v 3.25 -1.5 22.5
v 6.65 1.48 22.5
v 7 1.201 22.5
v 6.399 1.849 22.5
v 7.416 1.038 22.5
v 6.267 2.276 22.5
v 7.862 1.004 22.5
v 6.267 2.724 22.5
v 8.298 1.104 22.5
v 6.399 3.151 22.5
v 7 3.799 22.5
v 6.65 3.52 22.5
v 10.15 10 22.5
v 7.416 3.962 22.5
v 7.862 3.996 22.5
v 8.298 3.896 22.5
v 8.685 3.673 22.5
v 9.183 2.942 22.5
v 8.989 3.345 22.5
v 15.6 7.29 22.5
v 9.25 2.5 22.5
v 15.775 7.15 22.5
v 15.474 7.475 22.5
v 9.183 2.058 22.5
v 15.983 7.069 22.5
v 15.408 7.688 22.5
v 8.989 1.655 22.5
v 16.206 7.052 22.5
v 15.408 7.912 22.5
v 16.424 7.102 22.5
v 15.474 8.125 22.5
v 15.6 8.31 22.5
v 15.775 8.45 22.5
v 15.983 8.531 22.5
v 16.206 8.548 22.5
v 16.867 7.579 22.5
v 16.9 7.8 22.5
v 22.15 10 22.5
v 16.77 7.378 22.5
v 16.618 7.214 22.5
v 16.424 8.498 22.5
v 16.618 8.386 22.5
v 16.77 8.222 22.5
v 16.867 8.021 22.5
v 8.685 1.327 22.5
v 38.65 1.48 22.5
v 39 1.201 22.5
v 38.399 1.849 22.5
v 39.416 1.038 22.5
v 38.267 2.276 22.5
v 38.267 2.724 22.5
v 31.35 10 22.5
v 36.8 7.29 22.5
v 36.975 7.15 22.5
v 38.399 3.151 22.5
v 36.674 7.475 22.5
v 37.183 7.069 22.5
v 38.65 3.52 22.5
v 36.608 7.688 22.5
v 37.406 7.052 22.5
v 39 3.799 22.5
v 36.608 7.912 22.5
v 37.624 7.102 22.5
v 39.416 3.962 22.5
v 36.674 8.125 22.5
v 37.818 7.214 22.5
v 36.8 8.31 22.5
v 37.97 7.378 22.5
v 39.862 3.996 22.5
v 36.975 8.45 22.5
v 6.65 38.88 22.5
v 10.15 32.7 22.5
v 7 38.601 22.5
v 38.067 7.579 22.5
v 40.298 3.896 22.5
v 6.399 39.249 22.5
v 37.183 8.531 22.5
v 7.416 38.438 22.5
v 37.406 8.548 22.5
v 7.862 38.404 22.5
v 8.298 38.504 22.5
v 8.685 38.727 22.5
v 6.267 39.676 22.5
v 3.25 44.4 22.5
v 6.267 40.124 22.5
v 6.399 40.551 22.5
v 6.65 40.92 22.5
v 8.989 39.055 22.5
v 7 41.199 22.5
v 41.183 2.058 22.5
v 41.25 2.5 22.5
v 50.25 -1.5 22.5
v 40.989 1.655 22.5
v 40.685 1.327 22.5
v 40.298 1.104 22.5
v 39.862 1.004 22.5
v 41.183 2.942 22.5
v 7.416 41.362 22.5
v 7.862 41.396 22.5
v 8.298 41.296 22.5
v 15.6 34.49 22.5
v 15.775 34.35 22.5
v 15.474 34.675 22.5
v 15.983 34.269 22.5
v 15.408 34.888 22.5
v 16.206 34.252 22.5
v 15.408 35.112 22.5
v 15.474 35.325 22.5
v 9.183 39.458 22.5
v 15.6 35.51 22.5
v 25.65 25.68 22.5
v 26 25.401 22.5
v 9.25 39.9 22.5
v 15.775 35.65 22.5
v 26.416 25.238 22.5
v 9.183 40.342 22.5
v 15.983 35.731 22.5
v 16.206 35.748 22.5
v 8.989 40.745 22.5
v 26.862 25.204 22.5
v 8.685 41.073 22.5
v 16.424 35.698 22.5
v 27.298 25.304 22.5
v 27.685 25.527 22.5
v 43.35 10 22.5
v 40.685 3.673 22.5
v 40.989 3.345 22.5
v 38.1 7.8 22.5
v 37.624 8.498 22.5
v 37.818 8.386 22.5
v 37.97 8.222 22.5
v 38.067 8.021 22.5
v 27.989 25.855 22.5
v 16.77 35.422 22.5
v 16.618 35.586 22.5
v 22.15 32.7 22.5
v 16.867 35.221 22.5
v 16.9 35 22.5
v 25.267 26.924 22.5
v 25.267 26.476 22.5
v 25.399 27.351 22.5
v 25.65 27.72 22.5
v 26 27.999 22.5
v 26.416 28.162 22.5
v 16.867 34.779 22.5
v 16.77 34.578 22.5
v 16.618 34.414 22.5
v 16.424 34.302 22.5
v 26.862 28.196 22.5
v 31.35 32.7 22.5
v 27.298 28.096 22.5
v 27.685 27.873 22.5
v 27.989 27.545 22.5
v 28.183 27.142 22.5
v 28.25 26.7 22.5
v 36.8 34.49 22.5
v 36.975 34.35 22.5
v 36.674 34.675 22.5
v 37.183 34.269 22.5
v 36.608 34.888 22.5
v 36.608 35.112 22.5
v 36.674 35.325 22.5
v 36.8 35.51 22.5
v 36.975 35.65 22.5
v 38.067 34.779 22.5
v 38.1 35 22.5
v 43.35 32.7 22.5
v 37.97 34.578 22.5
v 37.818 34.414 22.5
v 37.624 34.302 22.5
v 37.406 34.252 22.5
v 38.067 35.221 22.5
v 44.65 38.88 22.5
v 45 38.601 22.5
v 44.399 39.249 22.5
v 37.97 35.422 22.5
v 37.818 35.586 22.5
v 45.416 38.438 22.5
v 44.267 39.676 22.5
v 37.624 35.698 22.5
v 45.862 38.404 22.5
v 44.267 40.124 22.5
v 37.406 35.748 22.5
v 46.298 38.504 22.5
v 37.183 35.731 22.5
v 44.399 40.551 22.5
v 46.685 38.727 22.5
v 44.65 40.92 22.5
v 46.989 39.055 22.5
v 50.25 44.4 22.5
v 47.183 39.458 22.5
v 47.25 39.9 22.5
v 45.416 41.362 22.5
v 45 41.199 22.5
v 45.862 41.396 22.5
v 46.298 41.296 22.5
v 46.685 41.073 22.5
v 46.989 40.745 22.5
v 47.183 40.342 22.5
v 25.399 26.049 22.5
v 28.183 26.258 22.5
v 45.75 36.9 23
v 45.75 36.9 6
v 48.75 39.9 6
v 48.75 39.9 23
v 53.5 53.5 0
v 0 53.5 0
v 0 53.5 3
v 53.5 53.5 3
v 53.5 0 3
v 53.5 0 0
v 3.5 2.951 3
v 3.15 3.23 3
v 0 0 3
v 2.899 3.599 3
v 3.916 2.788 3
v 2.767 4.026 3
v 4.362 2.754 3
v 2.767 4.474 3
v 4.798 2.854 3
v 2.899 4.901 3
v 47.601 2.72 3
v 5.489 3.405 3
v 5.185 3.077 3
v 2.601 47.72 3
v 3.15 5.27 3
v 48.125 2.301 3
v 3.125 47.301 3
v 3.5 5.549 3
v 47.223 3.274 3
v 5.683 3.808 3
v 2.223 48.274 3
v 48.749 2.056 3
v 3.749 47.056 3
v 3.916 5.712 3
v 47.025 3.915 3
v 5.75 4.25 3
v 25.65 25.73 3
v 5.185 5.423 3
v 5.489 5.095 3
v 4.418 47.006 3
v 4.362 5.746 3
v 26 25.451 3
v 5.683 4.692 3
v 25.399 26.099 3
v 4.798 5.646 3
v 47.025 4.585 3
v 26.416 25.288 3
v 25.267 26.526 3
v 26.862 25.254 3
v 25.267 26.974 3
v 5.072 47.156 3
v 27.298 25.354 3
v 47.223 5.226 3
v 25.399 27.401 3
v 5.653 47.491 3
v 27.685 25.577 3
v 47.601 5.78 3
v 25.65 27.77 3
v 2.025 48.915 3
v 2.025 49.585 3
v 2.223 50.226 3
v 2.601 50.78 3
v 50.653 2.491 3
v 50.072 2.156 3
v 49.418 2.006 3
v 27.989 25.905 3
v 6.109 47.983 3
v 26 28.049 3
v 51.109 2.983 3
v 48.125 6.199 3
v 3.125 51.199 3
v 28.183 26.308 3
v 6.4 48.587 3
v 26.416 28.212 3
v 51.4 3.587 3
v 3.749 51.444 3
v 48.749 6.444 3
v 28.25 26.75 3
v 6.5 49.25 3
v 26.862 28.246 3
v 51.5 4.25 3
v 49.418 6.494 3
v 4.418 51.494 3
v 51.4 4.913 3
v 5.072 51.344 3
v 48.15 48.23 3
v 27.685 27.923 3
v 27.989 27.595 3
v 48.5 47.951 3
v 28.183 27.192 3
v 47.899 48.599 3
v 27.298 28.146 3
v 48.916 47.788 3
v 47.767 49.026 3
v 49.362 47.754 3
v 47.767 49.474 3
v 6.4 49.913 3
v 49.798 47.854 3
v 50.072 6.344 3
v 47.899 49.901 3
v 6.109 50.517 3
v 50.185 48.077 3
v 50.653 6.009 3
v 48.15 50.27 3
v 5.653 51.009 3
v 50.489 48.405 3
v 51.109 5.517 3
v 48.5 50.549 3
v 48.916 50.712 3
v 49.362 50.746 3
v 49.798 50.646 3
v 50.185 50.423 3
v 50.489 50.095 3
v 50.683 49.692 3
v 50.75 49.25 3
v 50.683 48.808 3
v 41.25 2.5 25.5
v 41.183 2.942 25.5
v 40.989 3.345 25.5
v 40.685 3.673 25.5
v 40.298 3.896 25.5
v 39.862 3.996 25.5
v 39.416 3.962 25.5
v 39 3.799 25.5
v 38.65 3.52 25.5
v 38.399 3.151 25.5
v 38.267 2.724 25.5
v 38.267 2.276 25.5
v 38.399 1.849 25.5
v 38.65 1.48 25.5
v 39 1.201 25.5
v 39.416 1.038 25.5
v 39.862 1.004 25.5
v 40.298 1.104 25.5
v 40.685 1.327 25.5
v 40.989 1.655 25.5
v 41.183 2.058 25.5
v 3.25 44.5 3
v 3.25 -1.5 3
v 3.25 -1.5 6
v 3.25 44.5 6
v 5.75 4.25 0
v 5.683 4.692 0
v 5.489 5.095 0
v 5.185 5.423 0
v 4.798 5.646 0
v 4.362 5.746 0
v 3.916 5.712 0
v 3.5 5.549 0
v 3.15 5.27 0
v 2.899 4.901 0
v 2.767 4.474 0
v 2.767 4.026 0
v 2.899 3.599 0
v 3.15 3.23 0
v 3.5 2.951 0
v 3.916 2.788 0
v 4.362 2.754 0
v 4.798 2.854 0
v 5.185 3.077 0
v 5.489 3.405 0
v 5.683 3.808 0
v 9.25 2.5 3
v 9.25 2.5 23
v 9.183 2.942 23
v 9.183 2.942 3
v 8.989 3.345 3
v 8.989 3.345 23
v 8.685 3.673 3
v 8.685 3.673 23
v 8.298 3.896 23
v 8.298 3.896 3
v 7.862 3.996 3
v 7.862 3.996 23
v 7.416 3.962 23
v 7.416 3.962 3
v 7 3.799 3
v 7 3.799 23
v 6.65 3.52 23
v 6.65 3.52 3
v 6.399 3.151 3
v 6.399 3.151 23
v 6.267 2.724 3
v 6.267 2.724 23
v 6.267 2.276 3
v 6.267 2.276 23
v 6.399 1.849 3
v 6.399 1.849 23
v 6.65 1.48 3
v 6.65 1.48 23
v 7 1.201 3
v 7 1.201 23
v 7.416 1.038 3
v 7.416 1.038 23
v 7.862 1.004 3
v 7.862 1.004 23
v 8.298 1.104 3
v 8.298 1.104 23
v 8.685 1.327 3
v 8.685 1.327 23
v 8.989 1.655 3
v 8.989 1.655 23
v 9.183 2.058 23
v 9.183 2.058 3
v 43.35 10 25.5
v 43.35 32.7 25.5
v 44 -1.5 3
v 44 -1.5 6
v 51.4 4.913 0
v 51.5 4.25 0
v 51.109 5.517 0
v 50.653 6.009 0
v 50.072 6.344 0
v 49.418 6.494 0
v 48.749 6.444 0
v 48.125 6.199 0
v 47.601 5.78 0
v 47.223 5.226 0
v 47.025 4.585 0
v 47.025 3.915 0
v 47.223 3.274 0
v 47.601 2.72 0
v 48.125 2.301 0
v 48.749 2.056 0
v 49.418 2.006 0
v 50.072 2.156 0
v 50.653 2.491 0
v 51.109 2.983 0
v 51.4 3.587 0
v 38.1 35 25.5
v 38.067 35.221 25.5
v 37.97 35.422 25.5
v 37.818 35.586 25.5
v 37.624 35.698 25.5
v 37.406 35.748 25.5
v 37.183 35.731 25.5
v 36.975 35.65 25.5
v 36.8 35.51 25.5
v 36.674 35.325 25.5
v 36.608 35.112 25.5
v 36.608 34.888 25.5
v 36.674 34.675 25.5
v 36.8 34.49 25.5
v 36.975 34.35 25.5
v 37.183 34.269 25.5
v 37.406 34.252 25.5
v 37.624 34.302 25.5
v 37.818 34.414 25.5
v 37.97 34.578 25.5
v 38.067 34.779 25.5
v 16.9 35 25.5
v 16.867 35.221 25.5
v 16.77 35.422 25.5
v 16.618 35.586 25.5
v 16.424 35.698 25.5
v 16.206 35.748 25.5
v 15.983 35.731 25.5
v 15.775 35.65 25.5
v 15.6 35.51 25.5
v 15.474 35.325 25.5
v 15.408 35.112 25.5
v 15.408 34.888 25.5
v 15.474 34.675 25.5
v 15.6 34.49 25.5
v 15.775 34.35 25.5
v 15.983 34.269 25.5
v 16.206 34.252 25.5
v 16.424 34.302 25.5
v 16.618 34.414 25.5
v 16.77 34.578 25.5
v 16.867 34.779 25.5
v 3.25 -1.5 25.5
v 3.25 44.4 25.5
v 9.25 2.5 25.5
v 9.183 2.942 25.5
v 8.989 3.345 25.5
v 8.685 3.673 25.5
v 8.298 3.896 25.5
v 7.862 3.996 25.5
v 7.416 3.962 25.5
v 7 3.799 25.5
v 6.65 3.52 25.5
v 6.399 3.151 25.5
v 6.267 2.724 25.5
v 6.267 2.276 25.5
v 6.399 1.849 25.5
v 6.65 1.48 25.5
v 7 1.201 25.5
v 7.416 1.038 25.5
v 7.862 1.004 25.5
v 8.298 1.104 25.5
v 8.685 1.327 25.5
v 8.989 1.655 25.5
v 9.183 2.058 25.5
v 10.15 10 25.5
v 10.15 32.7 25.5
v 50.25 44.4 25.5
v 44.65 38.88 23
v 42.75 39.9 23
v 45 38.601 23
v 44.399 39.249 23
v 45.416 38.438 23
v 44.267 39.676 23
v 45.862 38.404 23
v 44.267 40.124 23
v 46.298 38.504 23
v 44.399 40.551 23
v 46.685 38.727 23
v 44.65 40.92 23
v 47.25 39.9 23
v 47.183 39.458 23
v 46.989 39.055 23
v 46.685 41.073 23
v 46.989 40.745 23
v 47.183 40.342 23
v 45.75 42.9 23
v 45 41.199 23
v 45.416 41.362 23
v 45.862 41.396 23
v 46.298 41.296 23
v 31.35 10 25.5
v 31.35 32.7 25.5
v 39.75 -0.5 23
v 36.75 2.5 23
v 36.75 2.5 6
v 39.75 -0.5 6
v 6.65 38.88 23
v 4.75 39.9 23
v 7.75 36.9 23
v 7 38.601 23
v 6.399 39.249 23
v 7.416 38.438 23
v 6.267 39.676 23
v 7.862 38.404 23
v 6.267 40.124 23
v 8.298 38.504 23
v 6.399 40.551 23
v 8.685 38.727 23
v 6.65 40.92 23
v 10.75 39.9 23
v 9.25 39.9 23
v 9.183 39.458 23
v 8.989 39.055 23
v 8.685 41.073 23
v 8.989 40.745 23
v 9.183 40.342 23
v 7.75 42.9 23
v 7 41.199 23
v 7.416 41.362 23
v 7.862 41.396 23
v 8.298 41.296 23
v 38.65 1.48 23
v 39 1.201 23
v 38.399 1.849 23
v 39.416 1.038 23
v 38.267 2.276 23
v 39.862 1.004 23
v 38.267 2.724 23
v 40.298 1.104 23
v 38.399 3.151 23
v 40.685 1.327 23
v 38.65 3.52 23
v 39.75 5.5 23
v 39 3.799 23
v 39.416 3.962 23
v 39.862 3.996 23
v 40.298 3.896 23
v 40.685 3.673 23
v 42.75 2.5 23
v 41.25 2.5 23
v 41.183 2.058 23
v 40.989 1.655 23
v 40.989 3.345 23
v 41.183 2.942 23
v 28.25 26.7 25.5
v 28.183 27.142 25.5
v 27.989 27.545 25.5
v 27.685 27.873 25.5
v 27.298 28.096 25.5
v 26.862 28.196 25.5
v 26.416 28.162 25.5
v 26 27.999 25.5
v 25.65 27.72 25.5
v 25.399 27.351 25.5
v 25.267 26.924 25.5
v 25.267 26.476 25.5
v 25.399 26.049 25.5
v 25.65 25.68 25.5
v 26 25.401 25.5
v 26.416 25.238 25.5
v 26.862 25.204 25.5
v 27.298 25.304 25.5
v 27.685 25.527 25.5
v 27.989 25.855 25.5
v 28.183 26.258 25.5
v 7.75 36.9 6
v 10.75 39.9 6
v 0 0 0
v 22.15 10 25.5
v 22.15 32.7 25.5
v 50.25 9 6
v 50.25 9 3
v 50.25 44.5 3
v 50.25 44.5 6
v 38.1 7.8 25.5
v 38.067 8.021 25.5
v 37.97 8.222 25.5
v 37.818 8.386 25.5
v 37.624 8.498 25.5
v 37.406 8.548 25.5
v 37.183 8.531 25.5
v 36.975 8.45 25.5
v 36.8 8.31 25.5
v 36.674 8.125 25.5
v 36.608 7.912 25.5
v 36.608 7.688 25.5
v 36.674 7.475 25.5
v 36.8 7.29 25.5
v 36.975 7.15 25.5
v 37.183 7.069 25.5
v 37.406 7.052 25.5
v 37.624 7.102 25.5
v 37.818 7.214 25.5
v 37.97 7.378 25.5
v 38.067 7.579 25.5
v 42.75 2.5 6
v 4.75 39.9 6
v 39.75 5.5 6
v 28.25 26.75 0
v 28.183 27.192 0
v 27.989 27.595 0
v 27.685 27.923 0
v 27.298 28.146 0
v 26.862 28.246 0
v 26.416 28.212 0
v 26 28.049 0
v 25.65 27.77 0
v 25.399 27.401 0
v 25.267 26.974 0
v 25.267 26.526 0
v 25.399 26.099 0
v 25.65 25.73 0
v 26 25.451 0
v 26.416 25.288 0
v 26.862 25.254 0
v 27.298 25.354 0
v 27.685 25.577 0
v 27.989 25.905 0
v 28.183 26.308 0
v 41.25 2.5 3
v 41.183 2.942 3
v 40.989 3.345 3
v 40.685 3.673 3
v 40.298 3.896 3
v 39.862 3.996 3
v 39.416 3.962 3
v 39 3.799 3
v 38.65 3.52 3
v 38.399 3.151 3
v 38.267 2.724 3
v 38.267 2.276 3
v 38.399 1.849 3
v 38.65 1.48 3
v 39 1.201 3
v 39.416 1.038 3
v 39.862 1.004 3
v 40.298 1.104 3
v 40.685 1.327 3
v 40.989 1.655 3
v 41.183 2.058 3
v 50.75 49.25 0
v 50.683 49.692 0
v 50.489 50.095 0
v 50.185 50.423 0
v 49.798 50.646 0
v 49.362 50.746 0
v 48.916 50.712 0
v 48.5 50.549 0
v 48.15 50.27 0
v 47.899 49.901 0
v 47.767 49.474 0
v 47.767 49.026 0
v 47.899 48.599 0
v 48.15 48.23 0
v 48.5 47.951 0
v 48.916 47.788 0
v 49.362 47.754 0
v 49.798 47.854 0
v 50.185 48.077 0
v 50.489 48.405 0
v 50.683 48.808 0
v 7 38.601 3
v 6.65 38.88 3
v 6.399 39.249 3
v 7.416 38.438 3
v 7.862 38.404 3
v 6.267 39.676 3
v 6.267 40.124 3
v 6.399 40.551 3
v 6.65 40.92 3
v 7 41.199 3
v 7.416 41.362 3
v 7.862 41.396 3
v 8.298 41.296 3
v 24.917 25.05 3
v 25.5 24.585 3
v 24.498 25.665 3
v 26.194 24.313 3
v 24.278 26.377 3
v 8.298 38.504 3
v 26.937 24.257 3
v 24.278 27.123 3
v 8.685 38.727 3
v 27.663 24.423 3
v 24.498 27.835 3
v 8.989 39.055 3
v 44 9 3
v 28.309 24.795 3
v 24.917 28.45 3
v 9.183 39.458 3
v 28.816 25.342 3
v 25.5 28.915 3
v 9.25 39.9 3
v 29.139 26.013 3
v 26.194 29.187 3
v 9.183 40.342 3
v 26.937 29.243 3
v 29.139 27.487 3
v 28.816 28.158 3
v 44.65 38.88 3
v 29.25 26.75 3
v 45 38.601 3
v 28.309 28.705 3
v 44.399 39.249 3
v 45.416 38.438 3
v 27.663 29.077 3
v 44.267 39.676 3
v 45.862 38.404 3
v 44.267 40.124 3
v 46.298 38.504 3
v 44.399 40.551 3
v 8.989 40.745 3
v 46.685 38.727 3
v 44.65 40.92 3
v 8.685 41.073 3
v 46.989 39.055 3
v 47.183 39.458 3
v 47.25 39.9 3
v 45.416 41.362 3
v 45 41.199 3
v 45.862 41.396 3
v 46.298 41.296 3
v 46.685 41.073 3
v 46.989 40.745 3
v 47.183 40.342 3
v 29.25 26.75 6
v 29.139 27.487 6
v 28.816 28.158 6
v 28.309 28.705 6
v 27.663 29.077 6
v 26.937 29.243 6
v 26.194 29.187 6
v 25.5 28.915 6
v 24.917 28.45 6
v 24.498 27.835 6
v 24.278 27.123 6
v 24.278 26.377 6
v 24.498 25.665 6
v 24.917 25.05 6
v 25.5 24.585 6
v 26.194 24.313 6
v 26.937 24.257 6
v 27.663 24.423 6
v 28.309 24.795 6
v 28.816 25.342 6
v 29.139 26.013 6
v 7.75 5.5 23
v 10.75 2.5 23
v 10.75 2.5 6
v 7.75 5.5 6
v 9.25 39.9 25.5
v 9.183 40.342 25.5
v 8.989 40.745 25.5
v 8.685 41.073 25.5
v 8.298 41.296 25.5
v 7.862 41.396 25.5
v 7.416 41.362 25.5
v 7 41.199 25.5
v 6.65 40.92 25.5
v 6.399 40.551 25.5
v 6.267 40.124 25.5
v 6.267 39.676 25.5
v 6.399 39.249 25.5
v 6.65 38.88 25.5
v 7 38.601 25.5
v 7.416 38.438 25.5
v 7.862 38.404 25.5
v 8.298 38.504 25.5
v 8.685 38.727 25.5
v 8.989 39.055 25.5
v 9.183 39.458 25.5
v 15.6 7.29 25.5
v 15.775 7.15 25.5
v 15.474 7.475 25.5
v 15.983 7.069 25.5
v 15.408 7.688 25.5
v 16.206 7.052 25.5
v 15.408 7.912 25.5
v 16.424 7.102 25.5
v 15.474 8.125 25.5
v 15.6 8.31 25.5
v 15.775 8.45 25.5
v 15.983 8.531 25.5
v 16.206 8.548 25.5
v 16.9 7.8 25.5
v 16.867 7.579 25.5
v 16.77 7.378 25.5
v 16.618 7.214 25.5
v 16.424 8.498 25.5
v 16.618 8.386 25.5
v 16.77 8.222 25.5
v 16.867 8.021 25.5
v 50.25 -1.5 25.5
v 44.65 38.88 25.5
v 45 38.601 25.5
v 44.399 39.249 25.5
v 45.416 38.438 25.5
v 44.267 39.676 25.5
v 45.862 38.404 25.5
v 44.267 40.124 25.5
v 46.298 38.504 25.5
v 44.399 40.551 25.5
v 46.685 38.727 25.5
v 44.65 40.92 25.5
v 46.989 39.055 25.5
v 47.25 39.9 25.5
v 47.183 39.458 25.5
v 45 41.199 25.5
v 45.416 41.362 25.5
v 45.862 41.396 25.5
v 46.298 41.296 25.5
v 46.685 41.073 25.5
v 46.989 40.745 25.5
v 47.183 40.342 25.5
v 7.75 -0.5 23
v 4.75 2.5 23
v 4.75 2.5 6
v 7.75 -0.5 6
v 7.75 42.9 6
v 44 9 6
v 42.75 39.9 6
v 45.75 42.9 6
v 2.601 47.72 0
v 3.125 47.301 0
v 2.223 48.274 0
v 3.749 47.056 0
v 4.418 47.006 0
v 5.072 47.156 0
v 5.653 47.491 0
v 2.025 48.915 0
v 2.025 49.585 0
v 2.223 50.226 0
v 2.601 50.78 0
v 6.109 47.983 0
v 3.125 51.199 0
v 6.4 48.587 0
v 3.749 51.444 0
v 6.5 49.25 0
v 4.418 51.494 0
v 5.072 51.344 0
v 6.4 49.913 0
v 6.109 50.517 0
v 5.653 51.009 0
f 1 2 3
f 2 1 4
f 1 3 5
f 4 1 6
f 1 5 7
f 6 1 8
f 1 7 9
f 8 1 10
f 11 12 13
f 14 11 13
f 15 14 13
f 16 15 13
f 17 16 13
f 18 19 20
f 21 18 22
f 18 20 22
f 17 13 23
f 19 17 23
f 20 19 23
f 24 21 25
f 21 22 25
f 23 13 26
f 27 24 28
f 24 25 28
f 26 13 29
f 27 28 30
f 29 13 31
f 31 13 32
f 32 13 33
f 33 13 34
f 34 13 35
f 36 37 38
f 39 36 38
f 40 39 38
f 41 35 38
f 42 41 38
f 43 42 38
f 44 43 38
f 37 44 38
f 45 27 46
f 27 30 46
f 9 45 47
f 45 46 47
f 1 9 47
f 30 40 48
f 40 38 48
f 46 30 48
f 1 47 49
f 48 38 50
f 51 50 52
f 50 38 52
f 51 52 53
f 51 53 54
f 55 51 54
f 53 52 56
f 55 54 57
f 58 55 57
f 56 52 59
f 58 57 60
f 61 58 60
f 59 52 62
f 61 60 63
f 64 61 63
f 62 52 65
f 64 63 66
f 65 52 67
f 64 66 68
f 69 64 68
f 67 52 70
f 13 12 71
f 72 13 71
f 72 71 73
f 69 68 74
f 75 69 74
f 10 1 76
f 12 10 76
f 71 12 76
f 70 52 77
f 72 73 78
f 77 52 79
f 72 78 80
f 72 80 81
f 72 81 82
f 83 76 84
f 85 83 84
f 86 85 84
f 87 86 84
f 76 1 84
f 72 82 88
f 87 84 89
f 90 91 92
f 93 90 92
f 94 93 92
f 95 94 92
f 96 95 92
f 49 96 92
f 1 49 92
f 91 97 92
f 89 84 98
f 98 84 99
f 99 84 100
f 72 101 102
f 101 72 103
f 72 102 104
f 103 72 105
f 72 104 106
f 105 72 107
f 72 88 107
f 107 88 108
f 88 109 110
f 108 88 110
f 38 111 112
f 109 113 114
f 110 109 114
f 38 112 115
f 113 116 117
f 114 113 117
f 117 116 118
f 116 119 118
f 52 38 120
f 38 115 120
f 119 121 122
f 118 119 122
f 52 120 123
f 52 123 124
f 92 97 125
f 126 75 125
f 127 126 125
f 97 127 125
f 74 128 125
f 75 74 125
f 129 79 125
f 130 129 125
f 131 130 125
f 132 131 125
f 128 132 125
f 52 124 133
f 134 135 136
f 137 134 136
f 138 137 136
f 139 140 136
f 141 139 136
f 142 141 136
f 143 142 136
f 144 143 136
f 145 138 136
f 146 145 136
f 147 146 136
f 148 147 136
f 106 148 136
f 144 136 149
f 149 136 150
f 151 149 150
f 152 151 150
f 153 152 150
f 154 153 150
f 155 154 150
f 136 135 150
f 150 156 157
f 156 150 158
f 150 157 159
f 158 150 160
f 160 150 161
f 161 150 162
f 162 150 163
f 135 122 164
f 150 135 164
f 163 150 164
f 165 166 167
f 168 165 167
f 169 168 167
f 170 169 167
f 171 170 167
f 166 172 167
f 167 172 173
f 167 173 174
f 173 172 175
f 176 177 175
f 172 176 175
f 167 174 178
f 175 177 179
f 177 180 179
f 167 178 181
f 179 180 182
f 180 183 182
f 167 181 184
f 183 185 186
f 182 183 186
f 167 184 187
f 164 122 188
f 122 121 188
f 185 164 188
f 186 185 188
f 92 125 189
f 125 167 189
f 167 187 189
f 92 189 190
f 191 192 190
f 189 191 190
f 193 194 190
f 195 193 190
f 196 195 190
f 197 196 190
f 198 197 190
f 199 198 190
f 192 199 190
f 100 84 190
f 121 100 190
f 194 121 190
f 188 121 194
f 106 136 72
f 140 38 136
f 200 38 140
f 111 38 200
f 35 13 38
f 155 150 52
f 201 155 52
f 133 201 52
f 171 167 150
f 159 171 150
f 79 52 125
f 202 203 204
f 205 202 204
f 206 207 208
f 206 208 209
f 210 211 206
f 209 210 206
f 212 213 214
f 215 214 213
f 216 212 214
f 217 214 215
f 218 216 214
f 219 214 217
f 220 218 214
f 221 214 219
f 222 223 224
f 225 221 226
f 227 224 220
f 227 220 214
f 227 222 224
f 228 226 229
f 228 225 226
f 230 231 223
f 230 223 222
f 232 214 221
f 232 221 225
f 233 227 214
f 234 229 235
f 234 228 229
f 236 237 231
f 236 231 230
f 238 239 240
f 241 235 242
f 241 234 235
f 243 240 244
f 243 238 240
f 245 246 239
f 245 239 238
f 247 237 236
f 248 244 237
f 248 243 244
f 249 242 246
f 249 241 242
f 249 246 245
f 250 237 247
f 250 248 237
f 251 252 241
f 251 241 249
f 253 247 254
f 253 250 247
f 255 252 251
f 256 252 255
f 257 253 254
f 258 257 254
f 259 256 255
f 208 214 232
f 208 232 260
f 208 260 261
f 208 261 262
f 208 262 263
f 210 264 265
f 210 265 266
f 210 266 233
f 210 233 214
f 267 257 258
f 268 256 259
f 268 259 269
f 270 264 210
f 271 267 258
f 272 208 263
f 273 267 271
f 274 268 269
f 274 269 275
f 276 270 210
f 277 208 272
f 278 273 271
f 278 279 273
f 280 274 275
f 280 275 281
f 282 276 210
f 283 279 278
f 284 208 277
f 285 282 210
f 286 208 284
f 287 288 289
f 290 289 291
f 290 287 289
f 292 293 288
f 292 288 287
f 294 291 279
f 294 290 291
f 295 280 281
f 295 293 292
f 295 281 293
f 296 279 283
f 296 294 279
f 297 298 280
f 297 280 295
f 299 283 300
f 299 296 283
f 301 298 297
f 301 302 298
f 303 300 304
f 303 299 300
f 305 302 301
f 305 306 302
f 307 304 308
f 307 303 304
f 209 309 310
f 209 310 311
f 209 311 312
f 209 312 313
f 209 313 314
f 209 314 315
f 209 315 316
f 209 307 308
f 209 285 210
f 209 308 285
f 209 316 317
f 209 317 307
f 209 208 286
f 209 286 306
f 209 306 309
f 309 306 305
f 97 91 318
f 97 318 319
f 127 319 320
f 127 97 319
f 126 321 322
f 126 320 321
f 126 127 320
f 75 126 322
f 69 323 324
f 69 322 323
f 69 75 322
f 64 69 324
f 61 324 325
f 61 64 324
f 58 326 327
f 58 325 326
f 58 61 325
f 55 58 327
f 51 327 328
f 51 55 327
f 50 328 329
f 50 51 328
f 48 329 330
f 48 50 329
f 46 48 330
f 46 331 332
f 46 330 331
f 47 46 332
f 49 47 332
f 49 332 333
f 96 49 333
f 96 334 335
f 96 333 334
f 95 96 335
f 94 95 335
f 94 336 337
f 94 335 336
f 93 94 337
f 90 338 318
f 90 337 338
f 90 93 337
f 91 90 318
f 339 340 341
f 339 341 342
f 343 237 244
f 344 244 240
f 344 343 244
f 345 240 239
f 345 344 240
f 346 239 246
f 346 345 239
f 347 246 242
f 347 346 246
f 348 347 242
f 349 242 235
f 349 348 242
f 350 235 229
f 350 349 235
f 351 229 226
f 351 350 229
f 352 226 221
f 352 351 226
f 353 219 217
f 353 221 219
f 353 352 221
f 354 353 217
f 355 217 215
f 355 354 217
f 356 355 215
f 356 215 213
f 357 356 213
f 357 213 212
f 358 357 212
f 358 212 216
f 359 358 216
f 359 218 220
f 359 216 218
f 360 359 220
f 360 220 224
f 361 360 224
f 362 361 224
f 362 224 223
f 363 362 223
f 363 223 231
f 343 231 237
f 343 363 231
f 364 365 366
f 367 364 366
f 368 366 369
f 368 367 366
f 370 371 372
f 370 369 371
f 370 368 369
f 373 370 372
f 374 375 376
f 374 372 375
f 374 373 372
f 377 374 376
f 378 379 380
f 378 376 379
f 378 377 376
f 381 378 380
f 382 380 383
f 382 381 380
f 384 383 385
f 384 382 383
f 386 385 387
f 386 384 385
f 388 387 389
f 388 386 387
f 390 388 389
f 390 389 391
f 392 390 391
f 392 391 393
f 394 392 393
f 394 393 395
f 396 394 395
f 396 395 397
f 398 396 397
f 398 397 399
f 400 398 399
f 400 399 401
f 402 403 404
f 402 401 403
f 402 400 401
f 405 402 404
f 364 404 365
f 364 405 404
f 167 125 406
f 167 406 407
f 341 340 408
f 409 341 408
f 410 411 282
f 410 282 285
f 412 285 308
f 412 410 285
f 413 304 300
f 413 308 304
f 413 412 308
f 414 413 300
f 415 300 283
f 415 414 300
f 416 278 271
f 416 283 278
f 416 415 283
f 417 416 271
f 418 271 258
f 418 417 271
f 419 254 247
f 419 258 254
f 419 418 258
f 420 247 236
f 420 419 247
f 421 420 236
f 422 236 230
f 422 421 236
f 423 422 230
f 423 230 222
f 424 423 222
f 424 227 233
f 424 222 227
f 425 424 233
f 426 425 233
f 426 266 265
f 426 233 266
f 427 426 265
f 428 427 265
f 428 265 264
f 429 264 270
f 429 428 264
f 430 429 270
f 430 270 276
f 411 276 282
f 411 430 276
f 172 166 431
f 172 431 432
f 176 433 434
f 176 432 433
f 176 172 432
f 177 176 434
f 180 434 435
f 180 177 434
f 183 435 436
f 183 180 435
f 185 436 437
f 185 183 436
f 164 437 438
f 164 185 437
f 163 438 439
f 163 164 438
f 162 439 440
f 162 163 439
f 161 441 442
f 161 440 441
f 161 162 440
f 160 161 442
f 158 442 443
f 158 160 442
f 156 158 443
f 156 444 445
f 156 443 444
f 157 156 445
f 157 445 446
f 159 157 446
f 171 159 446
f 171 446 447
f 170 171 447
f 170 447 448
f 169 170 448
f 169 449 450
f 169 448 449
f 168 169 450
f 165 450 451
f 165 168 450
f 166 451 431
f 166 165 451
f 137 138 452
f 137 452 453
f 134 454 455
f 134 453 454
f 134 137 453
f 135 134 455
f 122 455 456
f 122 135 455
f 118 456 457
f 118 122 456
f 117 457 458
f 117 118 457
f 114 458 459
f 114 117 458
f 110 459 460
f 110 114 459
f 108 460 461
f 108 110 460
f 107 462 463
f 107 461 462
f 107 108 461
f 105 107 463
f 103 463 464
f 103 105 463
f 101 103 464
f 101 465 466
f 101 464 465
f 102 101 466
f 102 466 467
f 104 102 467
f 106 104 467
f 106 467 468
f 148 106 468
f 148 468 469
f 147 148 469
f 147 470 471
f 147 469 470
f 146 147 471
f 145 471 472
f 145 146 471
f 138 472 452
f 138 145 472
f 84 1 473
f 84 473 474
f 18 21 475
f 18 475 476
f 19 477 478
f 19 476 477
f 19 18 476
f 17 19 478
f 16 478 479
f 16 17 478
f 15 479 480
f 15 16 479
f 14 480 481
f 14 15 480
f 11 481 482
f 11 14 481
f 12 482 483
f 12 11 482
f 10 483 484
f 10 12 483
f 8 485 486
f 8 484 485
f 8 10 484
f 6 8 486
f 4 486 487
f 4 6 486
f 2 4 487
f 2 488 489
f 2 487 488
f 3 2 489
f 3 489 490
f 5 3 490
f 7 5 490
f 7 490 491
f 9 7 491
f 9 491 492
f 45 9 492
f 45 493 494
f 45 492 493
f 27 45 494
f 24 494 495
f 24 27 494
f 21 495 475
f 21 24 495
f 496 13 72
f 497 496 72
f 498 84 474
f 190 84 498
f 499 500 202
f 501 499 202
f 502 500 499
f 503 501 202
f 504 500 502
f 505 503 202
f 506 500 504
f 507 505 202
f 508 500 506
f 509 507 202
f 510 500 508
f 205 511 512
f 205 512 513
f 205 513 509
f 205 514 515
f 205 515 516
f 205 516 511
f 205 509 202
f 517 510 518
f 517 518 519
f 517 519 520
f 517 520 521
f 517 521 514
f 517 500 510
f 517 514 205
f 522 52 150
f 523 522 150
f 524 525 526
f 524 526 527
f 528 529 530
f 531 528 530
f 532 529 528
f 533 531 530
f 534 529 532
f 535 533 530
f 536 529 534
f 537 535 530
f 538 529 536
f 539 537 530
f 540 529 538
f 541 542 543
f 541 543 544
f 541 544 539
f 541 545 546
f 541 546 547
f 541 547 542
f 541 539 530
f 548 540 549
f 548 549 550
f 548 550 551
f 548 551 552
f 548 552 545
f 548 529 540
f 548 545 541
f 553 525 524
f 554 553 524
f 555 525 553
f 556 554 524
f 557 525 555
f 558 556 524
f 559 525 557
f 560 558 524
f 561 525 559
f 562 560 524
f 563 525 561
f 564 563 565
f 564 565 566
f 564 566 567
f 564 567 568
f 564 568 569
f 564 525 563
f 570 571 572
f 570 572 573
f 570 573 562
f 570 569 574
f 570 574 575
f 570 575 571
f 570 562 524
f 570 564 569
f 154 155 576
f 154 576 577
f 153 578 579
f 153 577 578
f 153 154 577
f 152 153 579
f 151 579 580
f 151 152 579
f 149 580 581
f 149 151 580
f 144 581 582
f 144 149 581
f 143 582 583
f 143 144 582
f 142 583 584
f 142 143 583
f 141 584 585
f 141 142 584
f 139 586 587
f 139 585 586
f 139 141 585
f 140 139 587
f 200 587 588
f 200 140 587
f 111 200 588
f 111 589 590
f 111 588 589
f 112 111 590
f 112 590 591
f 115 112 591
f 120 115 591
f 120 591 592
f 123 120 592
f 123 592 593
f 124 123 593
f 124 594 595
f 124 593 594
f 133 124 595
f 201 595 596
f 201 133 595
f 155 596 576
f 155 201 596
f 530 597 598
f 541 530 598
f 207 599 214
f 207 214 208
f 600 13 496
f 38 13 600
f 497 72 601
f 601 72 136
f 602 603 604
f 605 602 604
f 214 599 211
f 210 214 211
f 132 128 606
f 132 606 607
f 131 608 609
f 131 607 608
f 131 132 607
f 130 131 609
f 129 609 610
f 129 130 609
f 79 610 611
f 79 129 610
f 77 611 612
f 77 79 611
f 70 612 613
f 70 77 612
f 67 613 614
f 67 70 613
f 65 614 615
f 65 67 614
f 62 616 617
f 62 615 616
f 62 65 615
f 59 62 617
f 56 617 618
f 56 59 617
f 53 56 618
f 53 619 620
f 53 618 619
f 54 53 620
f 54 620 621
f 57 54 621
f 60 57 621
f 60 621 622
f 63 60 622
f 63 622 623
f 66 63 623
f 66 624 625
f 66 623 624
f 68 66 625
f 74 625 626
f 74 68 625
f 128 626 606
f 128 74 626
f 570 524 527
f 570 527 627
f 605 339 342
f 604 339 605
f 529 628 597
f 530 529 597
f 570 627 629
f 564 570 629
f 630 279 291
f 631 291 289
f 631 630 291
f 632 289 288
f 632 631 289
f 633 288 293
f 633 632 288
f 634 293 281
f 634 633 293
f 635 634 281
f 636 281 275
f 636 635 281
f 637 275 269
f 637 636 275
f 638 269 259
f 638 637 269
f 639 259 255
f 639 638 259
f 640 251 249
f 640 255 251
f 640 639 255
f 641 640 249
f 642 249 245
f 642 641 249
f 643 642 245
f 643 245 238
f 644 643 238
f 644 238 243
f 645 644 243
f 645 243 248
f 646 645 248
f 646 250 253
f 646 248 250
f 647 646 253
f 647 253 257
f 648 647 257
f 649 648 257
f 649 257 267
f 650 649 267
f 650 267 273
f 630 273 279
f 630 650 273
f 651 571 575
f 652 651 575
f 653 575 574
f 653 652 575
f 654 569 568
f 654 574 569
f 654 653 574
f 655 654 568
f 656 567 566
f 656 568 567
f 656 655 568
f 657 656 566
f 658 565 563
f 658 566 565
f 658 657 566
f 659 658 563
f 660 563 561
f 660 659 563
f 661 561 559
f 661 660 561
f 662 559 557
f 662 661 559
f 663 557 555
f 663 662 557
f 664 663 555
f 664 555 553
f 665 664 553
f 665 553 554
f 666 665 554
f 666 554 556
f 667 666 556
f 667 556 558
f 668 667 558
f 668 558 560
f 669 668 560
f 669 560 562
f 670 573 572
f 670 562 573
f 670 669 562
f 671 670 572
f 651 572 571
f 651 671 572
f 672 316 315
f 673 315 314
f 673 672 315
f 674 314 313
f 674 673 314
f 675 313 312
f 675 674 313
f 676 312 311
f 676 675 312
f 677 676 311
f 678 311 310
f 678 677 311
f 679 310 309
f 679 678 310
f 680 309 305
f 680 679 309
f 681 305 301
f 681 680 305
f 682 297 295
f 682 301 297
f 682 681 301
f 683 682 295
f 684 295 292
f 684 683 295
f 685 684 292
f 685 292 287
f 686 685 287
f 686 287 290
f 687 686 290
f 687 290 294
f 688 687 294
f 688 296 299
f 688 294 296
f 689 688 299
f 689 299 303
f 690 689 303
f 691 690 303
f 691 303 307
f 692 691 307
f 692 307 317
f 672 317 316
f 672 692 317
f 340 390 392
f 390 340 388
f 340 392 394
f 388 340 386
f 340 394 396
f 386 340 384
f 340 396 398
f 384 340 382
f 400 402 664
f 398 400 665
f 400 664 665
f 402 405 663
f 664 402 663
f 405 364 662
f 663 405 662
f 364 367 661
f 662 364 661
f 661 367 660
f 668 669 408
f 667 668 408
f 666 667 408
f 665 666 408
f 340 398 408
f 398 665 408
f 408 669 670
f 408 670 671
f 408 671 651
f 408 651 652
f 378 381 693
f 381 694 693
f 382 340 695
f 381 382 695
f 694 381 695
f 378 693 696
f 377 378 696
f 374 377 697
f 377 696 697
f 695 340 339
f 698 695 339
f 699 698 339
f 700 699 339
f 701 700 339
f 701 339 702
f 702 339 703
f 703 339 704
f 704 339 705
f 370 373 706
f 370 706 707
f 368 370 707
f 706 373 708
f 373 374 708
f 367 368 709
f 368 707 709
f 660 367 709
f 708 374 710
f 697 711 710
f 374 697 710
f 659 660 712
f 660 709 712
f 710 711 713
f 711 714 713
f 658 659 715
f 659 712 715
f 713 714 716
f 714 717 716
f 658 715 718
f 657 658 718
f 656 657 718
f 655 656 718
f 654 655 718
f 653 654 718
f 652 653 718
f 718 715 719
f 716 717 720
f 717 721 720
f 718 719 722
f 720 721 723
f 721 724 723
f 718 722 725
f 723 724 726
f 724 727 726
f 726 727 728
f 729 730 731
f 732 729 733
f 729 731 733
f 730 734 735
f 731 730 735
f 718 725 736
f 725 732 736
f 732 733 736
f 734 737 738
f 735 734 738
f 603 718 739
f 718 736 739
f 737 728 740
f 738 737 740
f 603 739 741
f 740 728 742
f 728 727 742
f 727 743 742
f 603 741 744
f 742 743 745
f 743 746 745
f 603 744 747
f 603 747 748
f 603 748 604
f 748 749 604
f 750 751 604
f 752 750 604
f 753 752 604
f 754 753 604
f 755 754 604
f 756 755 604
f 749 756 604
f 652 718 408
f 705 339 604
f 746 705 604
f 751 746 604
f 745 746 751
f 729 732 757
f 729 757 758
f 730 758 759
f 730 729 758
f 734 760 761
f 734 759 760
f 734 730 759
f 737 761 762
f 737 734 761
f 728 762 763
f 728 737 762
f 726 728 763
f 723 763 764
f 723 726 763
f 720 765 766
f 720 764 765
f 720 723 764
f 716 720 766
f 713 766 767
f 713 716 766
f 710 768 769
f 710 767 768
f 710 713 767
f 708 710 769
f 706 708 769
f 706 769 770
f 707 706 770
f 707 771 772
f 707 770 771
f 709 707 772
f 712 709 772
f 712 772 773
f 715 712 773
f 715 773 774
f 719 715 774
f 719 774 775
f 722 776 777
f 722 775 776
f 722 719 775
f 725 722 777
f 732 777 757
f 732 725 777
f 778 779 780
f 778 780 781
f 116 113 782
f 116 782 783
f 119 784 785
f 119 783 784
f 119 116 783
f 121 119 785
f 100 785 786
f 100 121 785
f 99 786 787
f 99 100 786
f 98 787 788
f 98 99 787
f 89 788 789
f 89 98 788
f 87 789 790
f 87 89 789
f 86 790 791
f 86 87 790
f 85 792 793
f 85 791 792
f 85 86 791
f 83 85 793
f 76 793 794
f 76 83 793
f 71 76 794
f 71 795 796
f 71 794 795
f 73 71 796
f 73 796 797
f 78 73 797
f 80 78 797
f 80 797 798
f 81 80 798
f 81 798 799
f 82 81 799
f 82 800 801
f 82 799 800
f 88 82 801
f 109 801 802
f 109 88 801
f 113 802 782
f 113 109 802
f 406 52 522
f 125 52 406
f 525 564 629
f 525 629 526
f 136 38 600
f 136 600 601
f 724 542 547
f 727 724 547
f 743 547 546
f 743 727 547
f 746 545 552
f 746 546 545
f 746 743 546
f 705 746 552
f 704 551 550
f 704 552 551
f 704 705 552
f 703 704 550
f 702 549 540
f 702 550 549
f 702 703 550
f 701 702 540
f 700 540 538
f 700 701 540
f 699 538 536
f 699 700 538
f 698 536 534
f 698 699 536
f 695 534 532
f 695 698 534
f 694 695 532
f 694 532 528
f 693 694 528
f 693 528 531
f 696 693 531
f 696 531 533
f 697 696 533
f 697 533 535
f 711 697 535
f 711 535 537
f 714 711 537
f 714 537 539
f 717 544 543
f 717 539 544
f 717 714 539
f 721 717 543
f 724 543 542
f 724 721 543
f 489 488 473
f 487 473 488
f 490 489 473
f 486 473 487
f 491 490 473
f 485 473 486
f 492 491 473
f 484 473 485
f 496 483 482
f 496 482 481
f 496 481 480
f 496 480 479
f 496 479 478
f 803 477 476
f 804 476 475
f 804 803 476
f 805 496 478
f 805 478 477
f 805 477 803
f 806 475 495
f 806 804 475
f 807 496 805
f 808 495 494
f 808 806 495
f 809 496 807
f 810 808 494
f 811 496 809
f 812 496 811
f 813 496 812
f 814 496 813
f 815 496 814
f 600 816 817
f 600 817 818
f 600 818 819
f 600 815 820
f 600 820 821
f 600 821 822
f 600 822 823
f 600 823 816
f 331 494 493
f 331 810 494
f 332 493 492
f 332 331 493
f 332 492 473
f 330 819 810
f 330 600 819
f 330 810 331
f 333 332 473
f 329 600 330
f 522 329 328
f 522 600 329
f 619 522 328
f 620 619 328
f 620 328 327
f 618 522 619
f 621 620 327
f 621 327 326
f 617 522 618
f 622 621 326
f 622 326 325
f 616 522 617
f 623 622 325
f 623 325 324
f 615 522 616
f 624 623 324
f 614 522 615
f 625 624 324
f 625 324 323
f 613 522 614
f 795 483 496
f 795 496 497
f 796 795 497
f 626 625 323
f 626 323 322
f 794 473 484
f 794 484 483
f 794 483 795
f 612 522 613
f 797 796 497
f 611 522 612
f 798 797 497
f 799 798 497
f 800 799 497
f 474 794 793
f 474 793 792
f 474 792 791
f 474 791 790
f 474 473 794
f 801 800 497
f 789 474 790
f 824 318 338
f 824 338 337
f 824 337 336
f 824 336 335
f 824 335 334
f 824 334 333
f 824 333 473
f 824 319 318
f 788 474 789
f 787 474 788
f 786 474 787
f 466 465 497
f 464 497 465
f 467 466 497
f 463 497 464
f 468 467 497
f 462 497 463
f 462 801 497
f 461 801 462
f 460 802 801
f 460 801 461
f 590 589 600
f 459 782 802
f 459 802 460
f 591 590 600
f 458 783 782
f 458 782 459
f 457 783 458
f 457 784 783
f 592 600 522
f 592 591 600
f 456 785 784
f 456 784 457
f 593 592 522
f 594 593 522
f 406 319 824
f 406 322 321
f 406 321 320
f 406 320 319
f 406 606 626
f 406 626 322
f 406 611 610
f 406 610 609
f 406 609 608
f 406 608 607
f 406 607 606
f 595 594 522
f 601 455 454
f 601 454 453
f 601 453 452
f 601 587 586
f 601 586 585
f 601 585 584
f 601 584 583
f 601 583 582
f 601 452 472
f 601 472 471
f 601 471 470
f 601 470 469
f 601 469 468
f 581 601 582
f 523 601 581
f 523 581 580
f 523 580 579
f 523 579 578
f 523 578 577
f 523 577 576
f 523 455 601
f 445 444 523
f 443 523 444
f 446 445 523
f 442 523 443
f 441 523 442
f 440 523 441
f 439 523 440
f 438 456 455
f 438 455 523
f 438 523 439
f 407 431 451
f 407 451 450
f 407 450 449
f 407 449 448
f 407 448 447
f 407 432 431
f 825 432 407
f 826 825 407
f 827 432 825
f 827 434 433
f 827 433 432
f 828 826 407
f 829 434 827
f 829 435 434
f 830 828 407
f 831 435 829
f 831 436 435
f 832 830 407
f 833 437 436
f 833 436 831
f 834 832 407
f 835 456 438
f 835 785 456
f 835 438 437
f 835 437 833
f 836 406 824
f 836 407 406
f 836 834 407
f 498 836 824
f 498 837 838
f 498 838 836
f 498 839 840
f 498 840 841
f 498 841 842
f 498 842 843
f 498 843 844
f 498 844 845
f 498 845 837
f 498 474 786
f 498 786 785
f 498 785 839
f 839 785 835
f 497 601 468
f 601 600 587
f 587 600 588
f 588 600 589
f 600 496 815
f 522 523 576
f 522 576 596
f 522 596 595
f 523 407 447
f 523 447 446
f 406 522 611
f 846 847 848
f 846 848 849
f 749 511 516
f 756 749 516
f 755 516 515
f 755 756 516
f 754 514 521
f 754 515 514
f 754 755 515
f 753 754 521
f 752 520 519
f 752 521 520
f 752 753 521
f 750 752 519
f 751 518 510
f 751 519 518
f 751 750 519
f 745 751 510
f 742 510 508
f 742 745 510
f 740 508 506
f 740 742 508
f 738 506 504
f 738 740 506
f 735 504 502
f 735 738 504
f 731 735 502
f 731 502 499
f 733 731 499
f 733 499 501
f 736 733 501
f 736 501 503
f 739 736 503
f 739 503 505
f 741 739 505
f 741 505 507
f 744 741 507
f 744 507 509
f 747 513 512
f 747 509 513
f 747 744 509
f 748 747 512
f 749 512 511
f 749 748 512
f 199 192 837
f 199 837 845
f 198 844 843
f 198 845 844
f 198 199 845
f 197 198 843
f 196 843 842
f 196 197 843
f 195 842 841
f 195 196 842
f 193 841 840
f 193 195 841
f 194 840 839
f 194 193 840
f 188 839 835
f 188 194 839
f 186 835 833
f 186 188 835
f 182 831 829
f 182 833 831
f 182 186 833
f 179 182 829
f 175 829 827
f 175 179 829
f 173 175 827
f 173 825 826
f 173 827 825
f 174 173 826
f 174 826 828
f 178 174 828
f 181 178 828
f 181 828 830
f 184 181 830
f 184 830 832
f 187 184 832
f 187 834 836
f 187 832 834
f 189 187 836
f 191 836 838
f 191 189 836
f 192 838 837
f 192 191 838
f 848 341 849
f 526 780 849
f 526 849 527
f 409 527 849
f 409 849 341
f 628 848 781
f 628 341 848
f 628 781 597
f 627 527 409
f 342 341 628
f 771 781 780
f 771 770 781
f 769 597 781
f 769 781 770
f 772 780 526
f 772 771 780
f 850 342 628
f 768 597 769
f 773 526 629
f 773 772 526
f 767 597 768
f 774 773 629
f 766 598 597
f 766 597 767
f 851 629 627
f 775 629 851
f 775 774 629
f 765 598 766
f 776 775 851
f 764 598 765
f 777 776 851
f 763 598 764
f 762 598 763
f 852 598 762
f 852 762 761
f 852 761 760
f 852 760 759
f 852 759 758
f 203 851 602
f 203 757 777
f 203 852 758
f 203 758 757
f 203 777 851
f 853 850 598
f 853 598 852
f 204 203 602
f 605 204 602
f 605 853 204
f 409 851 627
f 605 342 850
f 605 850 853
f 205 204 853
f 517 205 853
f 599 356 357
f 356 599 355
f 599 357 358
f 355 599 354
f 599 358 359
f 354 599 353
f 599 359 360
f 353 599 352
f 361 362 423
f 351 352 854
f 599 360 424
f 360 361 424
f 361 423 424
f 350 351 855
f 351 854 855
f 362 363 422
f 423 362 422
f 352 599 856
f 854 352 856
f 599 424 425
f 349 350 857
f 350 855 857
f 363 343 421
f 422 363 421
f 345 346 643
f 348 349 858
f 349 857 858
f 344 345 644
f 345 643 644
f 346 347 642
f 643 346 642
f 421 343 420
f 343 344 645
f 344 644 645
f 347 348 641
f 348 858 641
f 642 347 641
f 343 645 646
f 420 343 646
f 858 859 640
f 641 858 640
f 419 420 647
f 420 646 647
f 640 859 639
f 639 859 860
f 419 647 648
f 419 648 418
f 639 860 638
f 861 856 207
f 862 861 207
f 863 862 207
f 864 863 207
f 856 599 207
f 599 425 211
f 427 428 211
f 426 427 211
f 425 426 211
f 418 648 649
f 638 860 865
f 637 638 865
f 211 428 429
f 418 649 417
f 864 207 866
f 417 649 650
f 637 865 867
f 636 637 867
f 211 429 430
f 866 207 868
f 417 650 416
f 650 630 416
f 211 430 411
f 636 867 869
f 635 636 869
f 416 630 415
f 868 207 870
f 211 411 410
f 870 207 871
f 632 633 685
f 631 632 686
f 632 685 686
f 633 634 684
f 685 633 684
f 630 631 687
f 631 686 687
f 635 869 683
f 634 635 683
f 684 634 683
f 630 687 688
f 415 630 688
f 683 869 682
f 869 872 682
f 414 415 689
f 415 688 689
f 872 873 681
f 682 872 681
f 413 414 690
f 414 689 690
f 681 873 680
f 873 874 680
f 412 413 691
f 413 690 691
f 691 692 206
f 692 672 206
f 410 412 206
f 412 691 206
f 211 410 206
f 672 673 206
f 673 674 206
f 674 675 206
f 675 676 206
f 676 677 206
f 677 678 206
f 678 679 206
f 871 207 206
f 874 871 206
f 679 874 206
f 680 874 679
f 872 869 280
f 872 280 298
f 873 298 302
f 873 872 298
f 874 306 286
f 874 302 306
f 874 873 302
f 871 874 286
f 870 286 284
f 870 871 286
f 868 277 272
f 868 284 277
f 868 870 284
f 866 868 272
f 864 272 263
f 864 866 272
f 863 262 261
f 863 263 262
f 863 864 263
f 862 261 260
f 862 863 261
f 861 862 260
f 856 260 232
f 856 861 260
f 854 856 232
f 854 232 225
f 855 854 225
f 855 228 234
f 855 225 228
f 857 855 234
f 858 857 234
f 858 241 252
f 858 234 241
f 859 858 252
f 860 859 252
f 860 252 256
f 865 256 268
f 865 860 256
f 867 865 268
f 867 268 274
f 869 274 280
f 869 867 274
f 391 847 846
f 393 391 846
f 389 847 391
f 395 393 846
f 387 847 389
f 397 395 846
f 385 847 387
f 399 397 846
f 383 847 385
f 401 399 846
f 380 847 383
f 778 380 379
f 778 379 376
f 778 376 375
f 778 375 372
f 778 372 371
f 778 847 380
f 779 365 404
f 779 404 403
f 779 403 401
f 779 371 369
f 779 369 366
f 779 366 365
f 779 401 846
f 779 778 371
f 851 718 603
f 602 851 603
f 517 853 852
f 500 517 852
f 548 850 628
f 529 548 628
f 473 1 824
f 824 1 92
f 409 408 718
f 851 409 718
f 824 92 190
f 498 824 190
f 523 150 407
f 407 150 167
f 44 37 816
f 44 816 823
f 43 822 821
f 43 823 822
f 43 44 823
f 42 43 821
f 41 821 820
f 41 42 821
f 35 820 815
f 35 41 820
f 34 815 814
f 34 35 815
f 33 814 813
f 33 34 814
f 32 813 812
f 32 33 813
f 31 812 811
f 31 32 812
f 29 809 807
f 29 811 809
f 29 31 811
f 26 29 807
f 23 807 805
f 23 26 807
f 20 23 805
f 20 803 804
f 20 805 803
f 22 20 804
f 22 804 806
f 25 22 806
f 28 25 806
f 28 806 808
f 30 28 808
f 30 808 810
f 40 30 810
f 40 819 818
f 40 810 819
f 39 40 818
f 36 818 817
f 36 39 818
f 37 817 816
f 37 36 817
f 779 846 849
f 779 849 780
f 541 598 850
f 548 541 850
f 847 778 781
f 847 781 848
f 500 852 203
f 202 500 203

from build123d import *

# Parameters (mm, degrees)
CYLINDER001_R     = 1.5
CYLINDER001_DEPTH = 10
ARRAY001_X_COUNT  = 3
ARRAY001_X_PITCH  = 31.819805
CYLINDER_R        = 2.25
CYLINDER_DEPTH    = 10
ARRAY_X_COUNT     = 2
ARRAY_X_PITCH     = 63.63961
BOX_W             = 53.5
BOX_H             = 53.5
BOX_DEPTH         = 3
CYLINDER009_R     = 1.5
CYLINDER009_DEPTH = 27
PRISM002_DEPTH    = 20
CYLINDER008_R     = 1.5
CYLINDER008_DEPTH = 27
BOX004_W          = 10
BOX004_H          = 11
BOX004_DEPTH      = 3
CYLINDER007_R     = 1.5
CYLINDER007_DEPTH = 27
PRISM001_DEPTH    = 20
CYLINDER003_R     = 1.5
CYLINDER003_DEPTH = 27
ARRAY002_Y_COUNT  = 2
ARRAY002_Y_PITCH  = 37.4
CYLINDER002_R     = 2.5
CYLINDER002_DEPTH = 10
PRISM_DEPTH       = 20
ARRAY003_Y_COUNT  = 2
ARRAY003_Y_PITCH  = 37.4
BOX001_W          = 47
BOX001_H          = 46
BOX001_DEPTH      = 3
CYLINDER011_R     = 1.5
CYLINDER011_DEPTH = 10
CYLINDER010_R     = 1.5
CYLINDER010_DEPTH = 10
CYLINDER006_R     = 0.75
CYLINDER006_DEPTH = 10
ARRAY006_X_COUNT  = 2
ARRAY006_X_PITCH  = 21.2
ARRAY006_Y_COUNT  = 2
ARRAY006_Y_PITCH  = 27.2
BOX003_W          = 12
BOX003_H          = 22.7
BOX003_DEPTH      = 10
ARRAY004_X_COUNT  = 2
ARRAY004_X_PITCH  = 21.2
CYLINDER004_R     = 1.5
CYLINDER004_DEPTH = 10
ARRAY005_Y_COUNT  = 2
ARRAY005_Y_PITCH  = 37.4
CYLINDER005_R     = 1.5
CYLINDER005_DEPTH = 10
BOX002_W          = 47
BOX002_H          = 45.9
BOX002_DEPTH      = 3


with BuildPart() as array001:
    # Cylinder001 → Cylinder001 (new body)
    with BuildSketch(Plane(origin=(4.25, 4.25, 0), x_dir=(1, 0, 0), z_dir=(0, 0, 1))):
        Circle(CYLINDER001_R)
    extrude(amount=CYLINDER001_DEPTH)

    # Array001 X: Array001 ×3


with BuildPart() as array001_1:
    add(array001.part)
    with Locations(*[Vector(0.707107, 0.707107, 0) * (i * ARRAY001_X_PITCH) for i in range(1, ARRAY001_X_COUNT)]):
        add(array001.part)


with BuildPart() as taladros:
    # Cylinder → Cylinder (new body)
    with BuildSketch(Plane(origin=(4.25, 49.25, -4), x_dir=(1, 0, 0), z_dir=(0, 0, 1))):
        Circle(CYLINDER_R)
    extrude(amount=CYLINDER_DEPTH)

    # Array X: Taladros ×2


with BuildPart() as taladros_1:
    add(taladros.part)
    with Locations(*[Vector(0.707107, -0.707107, 0) * (i * ARRAY_X_PITCH) for i in range(1, ARRAY_X_COUNT)]):
        add(taladros.part)

    # Fusion: union Array001
    add(array001_1.part)


with BuildPart() as fuel_temp_plate:
    # Box → Box (new body)
    with BuildSketch(Plane.XY):
        with Locations((26.75, 26.75)):
            Rectangle(BOX_W, BOX_H)
    extrude(amount=BOX_DEPTH)

    # Cut: cut Taladros
    add(taladros_1.part, mode=Mode.SUBTRACT)


with BuildPart() as cylinder009:
    # Cylinder009 → Cylinder009 (new body)
    with BuildSketch(Plane(origin=(39.75, 2.5, 0), x_dir=(1, 0, 0), z_dir=(0, 0, 1))):
        Circle(CYLINDER009_R)
    extrude(amount=CYLINDER009_DEPTH)


with BuildPart() as cut006:
    # Prism002 → Prism002 (new body)
    with BuildSketch(Plane(origin=(39.75, 2.5, 3), x_dir=(1, 0, 0), z_dir=(0, 0, 1))):
        Polygon((3, 0), (0, 3), (-3, 0), (0, -3), align=None)
    extrude(amount=PRISM002_DEPTH)

    # Cut006: cut Cylinder009
    add(cylinder009.part, mode=Mode.SUBTRACT)


with BuildPart() as cylinder008:
    # Cylinder008 → Cylinder008 (new body)
    with BuildSketch(Plane(origin=(39.75, 2.5, 0), x_dir=(1, 0, 0), z_dir=(0, 0, 1))):
        Circle(CYLINDER008_R)
    extrude(amount=CYLINDER008_DEPTH)


with BuildPart() as recorte_placa:
    # Box004 → Box004 (new body)
    with BuildSketch(Plane(origin=(44, -2, 3), x_dir=(1, 0, 0), z_dir=(0, 0, 1))):
        with Locations((5, 5.5)):
            Rectangle(BOX004_W, BOX004_H)
    extrude(amount=BOX004_DEPTH)


with BuildPart() as cylinder007:
    # Cylinder007 → Cylinder007 (new body)
    with BuildSketch(Plane(origin=(45.75, 39.9, 0), x_dir=(1, 0, 0), z_dir=(0, 0, 1))):
        Circle(CYLINDER007_R)
    extrude(amount=CYLINDER007_DEPTH)


with BuildPart() as prism001:
    # Prism001 → Prism001 (new body)
    with BuildSketch(Plane(origin=(45.75, 39.9, 3), x_dir=(1, 0, 0), z_dir=(0, 0, 1))):
        Polygon((3, 0), (0, 3), (-3, 0), (0, -3), align=None)
    extrude(amount=PRISM001_DEPTH)


with BuildPart() as array002:
    # Cylinder003 → Cylinder003 (new body)
    with BuildSketch(Plane(origin=(7.75, 2.5, 0), x_dir=(1, 0, 0), z_dir=(0, 0, 1))):
        Circle(CYLINDER003_R)
    extrude(amount=CYLINDER003_DEPTH)

    # Array002 Y: Array002 ×2


with BuildPart() as array002_1:
    add(array002.part)
    with Locations(*[(0, i * ARRAY002_Y_PITCH, 0) for i in range(1, ARRAY002_Y_COUNT)]):
        add(array002.part)


with BuildPart() as fusion002:
    # Cylinder002 → Cylinder002 (new body)
    with BuildSketch(Plane(origin=(26.75, 26.75, 0), x_dir=(1, 0, 0), z_dir=(0, 0, 1))):
        Circle(CYLINDER002_R)
    extrude(amount=CYLINDER002_DEPTH)

    # Fusion002: union Array002
    add(array002_1.part)


with BuildPart() as array_columnas:
    # Prism → Prism (new body)
    with BuildSketch(Plane(origin=(7.75, 2.5, 3), x_dir=(1, 0, 0), z_dir=(0, 0, 1))):
        Polygon((3, 0), (0, 3), (-3, 0), (0, -3), align=None)
    extrude(amount=PRISM_DEPTH)

    # Array003 Y: Array columnas ×2


with BuildPart() as array_columnas_1:
    add(array_columnas.part)
    with Locations(*[(0, i * ARRAY003_Y_PITCH, 0) for i in range(1, ARRAY003_Y_COUNT)]):
        add(array_columnas.part)


with BuildPart() as top_plate_final:
    # Box001 → Box001 (new body)
    with BuildSketch(Plane(origin=(3.25, -1.5, 3), x_dir=(1, 0, 0), z_dir=(0, 0, 1))):
        with Locations((23.5, 23)):
            Rectangle(BOX001_W, BOX001_H)
    extrude(amount=BOX001_DEPTH)

    # Fusion001: union Array columnas
    add(array_columnas_1.part)

    # Cut001: cut Fusion002
    add(fusion002.part, mode=Mode.SUBTRACT)

    # Fusion004: union Prism001
    add(prism001.part)

    # Cut003: cut Cylinder007
    add(cylinder007.part, mode=Mode.SUBTRACT)

    # Cut004: cut Recorte placa
    add(recorte_placa.part, mode=Mode.SUBTRACT)

    # Cut005: cut Cylinder008
    add(cylinder008.part, mode=Mode.SUBTRACT)

    # Fusion005: union Cut006
    add(cut006.part)


with BuildPart() as cylinder011:
    # Cylinder011 → Cylinder011 (new body)
    with BuildSketch(Plane(origin=(39.75, 2.5, 18.5), x_dir=(1, 0, 0), z_dir=(0, 0, 1))):
        Circle(CYLINDER011_R)
    extrude(amount=CYLINDER011_DEPTH)


with BuildPart() as cylinder010:
    # Cylinder010 → Cylinder010 (new body)
    with BuildSketch(Plane(origin=(45.75, 39.9, 19.5), x_dir=(1, 0, 0), z_dir=(0, 0, 1))):
        Circle(CYLINDER010_R)
    extrude(amount=CYLINDER010_DEPTH)


with BuildPart() as array006:
    # Cylinder006 → Cylinder006 (new body)
    with BuildSketch(Plane(origin=(16.15, 7.8, 19.5), x_dir=(1, 0, 0), z_dir=(0, 0, 1))):
        Circle(CYLINDER006_R)
    extrude(amount=CYLINDER006_DEPTH)

    # Array006 X: Array006 ×2


with BuildPart() as array006_1:
    add(array006.part)
    with Locations(*[(i * ARRAY006_X_PITCH, 0, 0) for i in range(1, ARRAY006_X_COUNT)]):
        add(array006.part)

    # Array006 Y: Array006 ×2


with BuildPart() as array006_2:
    add(array006_1.part)
    with Locations(*[(0, i * ARRAY006_Y_PITCH, 0) for i in range(1, ARRAY006_Y_COUNT)]):
        add(array006_1.part)


with BuildPart() as array_taladro_servomotor:
    # Box003 → Box003 (new body)
    with BuildSketch(Plane(origin=(10.15, 10, 19.5), x_dir=(1, 0, 0), z_dir=(0, 0, 1))):
        with Locations((6, 11.35)):
            Rectangle(BOX003_W, BOX003_H)
    extrude(amount=BOX003_DEPTH)

    # Array004 X: Array taladro servomotor ×2


with BuildPart() as array_taladro_servomotor_1:
    add(array_taladro_servomotor.part)
    with Locations(*[(i * ARRAY004_X_PITCH, 0, 0) for i in range(1, ARRAY004_X_COUNT)]):
        add(array_taladro_servomotor.part)


with BuildPart() as array005:
    # Cylinder004 → Cylinder004 (new body)
    with BuildSketch(Plane(origin=(7.75, 2.5, 19.5), x_dir=(1, 0, 0), z_dir=(0, 0, 1))):
        Circle(CYLINDER004_R)
    extrude(amount=CYLINDER004_DEPTH)

    # Array005 Y: Array005 ×2


with BuildPart() as array005_1:
    add(array005.part)
    with Locations(*[(0, i * ARRAY005_Y_PITCH, 0) for i in range(1, ARRAY005_Y_COUNT)]):
        add(array005.part)


with BuildPart() as fusion003:
    # Cylinder005 → Cylinder005 (new body)
    with BuildSketch(Plane(origin=(26.75, 26.7, 19.5), x_dir=(1, 0, 0), z_dir=(0, 0, 1))):
        Circle(CYLINDER005_R)
    extrude(amount=CYLINDER005_DEPTH)

    # Fusion003: union Array006, Array taladro servomotor, Array005
    add(array006_2.part)
    add(array_taladro_servomotor_1.part)
    add(array005_1.part)


with BuildPart() as base_final:
    # Box002 → Box002 (new body)
    with BuildSketch(Plane(origin=(3.25, -1.5, 22.5), x_dir=(1, 0, 0), z_dir=(0, 0, 1))):
        with Locations((23.5, 22.95)):
            Rectangle(BOX002_W, BOX002_H)
    extrude(amount=BOX002_DEPTH)

    # Cut002: cut Fusion003
    add(fusion003.part, mode=Mode.SUBTRACT)

    # Cut007: cut Cylinder010
    add(cylinder010.part, mode=Mode.SUBTRACT)

    # Cut008: cut Cylinder011
    add(cylinder011.part, mode=Mode.SUBTRACT)


solid = Compound([fuel_temp_plate.part, top_plate_final.part, base_final.part])
